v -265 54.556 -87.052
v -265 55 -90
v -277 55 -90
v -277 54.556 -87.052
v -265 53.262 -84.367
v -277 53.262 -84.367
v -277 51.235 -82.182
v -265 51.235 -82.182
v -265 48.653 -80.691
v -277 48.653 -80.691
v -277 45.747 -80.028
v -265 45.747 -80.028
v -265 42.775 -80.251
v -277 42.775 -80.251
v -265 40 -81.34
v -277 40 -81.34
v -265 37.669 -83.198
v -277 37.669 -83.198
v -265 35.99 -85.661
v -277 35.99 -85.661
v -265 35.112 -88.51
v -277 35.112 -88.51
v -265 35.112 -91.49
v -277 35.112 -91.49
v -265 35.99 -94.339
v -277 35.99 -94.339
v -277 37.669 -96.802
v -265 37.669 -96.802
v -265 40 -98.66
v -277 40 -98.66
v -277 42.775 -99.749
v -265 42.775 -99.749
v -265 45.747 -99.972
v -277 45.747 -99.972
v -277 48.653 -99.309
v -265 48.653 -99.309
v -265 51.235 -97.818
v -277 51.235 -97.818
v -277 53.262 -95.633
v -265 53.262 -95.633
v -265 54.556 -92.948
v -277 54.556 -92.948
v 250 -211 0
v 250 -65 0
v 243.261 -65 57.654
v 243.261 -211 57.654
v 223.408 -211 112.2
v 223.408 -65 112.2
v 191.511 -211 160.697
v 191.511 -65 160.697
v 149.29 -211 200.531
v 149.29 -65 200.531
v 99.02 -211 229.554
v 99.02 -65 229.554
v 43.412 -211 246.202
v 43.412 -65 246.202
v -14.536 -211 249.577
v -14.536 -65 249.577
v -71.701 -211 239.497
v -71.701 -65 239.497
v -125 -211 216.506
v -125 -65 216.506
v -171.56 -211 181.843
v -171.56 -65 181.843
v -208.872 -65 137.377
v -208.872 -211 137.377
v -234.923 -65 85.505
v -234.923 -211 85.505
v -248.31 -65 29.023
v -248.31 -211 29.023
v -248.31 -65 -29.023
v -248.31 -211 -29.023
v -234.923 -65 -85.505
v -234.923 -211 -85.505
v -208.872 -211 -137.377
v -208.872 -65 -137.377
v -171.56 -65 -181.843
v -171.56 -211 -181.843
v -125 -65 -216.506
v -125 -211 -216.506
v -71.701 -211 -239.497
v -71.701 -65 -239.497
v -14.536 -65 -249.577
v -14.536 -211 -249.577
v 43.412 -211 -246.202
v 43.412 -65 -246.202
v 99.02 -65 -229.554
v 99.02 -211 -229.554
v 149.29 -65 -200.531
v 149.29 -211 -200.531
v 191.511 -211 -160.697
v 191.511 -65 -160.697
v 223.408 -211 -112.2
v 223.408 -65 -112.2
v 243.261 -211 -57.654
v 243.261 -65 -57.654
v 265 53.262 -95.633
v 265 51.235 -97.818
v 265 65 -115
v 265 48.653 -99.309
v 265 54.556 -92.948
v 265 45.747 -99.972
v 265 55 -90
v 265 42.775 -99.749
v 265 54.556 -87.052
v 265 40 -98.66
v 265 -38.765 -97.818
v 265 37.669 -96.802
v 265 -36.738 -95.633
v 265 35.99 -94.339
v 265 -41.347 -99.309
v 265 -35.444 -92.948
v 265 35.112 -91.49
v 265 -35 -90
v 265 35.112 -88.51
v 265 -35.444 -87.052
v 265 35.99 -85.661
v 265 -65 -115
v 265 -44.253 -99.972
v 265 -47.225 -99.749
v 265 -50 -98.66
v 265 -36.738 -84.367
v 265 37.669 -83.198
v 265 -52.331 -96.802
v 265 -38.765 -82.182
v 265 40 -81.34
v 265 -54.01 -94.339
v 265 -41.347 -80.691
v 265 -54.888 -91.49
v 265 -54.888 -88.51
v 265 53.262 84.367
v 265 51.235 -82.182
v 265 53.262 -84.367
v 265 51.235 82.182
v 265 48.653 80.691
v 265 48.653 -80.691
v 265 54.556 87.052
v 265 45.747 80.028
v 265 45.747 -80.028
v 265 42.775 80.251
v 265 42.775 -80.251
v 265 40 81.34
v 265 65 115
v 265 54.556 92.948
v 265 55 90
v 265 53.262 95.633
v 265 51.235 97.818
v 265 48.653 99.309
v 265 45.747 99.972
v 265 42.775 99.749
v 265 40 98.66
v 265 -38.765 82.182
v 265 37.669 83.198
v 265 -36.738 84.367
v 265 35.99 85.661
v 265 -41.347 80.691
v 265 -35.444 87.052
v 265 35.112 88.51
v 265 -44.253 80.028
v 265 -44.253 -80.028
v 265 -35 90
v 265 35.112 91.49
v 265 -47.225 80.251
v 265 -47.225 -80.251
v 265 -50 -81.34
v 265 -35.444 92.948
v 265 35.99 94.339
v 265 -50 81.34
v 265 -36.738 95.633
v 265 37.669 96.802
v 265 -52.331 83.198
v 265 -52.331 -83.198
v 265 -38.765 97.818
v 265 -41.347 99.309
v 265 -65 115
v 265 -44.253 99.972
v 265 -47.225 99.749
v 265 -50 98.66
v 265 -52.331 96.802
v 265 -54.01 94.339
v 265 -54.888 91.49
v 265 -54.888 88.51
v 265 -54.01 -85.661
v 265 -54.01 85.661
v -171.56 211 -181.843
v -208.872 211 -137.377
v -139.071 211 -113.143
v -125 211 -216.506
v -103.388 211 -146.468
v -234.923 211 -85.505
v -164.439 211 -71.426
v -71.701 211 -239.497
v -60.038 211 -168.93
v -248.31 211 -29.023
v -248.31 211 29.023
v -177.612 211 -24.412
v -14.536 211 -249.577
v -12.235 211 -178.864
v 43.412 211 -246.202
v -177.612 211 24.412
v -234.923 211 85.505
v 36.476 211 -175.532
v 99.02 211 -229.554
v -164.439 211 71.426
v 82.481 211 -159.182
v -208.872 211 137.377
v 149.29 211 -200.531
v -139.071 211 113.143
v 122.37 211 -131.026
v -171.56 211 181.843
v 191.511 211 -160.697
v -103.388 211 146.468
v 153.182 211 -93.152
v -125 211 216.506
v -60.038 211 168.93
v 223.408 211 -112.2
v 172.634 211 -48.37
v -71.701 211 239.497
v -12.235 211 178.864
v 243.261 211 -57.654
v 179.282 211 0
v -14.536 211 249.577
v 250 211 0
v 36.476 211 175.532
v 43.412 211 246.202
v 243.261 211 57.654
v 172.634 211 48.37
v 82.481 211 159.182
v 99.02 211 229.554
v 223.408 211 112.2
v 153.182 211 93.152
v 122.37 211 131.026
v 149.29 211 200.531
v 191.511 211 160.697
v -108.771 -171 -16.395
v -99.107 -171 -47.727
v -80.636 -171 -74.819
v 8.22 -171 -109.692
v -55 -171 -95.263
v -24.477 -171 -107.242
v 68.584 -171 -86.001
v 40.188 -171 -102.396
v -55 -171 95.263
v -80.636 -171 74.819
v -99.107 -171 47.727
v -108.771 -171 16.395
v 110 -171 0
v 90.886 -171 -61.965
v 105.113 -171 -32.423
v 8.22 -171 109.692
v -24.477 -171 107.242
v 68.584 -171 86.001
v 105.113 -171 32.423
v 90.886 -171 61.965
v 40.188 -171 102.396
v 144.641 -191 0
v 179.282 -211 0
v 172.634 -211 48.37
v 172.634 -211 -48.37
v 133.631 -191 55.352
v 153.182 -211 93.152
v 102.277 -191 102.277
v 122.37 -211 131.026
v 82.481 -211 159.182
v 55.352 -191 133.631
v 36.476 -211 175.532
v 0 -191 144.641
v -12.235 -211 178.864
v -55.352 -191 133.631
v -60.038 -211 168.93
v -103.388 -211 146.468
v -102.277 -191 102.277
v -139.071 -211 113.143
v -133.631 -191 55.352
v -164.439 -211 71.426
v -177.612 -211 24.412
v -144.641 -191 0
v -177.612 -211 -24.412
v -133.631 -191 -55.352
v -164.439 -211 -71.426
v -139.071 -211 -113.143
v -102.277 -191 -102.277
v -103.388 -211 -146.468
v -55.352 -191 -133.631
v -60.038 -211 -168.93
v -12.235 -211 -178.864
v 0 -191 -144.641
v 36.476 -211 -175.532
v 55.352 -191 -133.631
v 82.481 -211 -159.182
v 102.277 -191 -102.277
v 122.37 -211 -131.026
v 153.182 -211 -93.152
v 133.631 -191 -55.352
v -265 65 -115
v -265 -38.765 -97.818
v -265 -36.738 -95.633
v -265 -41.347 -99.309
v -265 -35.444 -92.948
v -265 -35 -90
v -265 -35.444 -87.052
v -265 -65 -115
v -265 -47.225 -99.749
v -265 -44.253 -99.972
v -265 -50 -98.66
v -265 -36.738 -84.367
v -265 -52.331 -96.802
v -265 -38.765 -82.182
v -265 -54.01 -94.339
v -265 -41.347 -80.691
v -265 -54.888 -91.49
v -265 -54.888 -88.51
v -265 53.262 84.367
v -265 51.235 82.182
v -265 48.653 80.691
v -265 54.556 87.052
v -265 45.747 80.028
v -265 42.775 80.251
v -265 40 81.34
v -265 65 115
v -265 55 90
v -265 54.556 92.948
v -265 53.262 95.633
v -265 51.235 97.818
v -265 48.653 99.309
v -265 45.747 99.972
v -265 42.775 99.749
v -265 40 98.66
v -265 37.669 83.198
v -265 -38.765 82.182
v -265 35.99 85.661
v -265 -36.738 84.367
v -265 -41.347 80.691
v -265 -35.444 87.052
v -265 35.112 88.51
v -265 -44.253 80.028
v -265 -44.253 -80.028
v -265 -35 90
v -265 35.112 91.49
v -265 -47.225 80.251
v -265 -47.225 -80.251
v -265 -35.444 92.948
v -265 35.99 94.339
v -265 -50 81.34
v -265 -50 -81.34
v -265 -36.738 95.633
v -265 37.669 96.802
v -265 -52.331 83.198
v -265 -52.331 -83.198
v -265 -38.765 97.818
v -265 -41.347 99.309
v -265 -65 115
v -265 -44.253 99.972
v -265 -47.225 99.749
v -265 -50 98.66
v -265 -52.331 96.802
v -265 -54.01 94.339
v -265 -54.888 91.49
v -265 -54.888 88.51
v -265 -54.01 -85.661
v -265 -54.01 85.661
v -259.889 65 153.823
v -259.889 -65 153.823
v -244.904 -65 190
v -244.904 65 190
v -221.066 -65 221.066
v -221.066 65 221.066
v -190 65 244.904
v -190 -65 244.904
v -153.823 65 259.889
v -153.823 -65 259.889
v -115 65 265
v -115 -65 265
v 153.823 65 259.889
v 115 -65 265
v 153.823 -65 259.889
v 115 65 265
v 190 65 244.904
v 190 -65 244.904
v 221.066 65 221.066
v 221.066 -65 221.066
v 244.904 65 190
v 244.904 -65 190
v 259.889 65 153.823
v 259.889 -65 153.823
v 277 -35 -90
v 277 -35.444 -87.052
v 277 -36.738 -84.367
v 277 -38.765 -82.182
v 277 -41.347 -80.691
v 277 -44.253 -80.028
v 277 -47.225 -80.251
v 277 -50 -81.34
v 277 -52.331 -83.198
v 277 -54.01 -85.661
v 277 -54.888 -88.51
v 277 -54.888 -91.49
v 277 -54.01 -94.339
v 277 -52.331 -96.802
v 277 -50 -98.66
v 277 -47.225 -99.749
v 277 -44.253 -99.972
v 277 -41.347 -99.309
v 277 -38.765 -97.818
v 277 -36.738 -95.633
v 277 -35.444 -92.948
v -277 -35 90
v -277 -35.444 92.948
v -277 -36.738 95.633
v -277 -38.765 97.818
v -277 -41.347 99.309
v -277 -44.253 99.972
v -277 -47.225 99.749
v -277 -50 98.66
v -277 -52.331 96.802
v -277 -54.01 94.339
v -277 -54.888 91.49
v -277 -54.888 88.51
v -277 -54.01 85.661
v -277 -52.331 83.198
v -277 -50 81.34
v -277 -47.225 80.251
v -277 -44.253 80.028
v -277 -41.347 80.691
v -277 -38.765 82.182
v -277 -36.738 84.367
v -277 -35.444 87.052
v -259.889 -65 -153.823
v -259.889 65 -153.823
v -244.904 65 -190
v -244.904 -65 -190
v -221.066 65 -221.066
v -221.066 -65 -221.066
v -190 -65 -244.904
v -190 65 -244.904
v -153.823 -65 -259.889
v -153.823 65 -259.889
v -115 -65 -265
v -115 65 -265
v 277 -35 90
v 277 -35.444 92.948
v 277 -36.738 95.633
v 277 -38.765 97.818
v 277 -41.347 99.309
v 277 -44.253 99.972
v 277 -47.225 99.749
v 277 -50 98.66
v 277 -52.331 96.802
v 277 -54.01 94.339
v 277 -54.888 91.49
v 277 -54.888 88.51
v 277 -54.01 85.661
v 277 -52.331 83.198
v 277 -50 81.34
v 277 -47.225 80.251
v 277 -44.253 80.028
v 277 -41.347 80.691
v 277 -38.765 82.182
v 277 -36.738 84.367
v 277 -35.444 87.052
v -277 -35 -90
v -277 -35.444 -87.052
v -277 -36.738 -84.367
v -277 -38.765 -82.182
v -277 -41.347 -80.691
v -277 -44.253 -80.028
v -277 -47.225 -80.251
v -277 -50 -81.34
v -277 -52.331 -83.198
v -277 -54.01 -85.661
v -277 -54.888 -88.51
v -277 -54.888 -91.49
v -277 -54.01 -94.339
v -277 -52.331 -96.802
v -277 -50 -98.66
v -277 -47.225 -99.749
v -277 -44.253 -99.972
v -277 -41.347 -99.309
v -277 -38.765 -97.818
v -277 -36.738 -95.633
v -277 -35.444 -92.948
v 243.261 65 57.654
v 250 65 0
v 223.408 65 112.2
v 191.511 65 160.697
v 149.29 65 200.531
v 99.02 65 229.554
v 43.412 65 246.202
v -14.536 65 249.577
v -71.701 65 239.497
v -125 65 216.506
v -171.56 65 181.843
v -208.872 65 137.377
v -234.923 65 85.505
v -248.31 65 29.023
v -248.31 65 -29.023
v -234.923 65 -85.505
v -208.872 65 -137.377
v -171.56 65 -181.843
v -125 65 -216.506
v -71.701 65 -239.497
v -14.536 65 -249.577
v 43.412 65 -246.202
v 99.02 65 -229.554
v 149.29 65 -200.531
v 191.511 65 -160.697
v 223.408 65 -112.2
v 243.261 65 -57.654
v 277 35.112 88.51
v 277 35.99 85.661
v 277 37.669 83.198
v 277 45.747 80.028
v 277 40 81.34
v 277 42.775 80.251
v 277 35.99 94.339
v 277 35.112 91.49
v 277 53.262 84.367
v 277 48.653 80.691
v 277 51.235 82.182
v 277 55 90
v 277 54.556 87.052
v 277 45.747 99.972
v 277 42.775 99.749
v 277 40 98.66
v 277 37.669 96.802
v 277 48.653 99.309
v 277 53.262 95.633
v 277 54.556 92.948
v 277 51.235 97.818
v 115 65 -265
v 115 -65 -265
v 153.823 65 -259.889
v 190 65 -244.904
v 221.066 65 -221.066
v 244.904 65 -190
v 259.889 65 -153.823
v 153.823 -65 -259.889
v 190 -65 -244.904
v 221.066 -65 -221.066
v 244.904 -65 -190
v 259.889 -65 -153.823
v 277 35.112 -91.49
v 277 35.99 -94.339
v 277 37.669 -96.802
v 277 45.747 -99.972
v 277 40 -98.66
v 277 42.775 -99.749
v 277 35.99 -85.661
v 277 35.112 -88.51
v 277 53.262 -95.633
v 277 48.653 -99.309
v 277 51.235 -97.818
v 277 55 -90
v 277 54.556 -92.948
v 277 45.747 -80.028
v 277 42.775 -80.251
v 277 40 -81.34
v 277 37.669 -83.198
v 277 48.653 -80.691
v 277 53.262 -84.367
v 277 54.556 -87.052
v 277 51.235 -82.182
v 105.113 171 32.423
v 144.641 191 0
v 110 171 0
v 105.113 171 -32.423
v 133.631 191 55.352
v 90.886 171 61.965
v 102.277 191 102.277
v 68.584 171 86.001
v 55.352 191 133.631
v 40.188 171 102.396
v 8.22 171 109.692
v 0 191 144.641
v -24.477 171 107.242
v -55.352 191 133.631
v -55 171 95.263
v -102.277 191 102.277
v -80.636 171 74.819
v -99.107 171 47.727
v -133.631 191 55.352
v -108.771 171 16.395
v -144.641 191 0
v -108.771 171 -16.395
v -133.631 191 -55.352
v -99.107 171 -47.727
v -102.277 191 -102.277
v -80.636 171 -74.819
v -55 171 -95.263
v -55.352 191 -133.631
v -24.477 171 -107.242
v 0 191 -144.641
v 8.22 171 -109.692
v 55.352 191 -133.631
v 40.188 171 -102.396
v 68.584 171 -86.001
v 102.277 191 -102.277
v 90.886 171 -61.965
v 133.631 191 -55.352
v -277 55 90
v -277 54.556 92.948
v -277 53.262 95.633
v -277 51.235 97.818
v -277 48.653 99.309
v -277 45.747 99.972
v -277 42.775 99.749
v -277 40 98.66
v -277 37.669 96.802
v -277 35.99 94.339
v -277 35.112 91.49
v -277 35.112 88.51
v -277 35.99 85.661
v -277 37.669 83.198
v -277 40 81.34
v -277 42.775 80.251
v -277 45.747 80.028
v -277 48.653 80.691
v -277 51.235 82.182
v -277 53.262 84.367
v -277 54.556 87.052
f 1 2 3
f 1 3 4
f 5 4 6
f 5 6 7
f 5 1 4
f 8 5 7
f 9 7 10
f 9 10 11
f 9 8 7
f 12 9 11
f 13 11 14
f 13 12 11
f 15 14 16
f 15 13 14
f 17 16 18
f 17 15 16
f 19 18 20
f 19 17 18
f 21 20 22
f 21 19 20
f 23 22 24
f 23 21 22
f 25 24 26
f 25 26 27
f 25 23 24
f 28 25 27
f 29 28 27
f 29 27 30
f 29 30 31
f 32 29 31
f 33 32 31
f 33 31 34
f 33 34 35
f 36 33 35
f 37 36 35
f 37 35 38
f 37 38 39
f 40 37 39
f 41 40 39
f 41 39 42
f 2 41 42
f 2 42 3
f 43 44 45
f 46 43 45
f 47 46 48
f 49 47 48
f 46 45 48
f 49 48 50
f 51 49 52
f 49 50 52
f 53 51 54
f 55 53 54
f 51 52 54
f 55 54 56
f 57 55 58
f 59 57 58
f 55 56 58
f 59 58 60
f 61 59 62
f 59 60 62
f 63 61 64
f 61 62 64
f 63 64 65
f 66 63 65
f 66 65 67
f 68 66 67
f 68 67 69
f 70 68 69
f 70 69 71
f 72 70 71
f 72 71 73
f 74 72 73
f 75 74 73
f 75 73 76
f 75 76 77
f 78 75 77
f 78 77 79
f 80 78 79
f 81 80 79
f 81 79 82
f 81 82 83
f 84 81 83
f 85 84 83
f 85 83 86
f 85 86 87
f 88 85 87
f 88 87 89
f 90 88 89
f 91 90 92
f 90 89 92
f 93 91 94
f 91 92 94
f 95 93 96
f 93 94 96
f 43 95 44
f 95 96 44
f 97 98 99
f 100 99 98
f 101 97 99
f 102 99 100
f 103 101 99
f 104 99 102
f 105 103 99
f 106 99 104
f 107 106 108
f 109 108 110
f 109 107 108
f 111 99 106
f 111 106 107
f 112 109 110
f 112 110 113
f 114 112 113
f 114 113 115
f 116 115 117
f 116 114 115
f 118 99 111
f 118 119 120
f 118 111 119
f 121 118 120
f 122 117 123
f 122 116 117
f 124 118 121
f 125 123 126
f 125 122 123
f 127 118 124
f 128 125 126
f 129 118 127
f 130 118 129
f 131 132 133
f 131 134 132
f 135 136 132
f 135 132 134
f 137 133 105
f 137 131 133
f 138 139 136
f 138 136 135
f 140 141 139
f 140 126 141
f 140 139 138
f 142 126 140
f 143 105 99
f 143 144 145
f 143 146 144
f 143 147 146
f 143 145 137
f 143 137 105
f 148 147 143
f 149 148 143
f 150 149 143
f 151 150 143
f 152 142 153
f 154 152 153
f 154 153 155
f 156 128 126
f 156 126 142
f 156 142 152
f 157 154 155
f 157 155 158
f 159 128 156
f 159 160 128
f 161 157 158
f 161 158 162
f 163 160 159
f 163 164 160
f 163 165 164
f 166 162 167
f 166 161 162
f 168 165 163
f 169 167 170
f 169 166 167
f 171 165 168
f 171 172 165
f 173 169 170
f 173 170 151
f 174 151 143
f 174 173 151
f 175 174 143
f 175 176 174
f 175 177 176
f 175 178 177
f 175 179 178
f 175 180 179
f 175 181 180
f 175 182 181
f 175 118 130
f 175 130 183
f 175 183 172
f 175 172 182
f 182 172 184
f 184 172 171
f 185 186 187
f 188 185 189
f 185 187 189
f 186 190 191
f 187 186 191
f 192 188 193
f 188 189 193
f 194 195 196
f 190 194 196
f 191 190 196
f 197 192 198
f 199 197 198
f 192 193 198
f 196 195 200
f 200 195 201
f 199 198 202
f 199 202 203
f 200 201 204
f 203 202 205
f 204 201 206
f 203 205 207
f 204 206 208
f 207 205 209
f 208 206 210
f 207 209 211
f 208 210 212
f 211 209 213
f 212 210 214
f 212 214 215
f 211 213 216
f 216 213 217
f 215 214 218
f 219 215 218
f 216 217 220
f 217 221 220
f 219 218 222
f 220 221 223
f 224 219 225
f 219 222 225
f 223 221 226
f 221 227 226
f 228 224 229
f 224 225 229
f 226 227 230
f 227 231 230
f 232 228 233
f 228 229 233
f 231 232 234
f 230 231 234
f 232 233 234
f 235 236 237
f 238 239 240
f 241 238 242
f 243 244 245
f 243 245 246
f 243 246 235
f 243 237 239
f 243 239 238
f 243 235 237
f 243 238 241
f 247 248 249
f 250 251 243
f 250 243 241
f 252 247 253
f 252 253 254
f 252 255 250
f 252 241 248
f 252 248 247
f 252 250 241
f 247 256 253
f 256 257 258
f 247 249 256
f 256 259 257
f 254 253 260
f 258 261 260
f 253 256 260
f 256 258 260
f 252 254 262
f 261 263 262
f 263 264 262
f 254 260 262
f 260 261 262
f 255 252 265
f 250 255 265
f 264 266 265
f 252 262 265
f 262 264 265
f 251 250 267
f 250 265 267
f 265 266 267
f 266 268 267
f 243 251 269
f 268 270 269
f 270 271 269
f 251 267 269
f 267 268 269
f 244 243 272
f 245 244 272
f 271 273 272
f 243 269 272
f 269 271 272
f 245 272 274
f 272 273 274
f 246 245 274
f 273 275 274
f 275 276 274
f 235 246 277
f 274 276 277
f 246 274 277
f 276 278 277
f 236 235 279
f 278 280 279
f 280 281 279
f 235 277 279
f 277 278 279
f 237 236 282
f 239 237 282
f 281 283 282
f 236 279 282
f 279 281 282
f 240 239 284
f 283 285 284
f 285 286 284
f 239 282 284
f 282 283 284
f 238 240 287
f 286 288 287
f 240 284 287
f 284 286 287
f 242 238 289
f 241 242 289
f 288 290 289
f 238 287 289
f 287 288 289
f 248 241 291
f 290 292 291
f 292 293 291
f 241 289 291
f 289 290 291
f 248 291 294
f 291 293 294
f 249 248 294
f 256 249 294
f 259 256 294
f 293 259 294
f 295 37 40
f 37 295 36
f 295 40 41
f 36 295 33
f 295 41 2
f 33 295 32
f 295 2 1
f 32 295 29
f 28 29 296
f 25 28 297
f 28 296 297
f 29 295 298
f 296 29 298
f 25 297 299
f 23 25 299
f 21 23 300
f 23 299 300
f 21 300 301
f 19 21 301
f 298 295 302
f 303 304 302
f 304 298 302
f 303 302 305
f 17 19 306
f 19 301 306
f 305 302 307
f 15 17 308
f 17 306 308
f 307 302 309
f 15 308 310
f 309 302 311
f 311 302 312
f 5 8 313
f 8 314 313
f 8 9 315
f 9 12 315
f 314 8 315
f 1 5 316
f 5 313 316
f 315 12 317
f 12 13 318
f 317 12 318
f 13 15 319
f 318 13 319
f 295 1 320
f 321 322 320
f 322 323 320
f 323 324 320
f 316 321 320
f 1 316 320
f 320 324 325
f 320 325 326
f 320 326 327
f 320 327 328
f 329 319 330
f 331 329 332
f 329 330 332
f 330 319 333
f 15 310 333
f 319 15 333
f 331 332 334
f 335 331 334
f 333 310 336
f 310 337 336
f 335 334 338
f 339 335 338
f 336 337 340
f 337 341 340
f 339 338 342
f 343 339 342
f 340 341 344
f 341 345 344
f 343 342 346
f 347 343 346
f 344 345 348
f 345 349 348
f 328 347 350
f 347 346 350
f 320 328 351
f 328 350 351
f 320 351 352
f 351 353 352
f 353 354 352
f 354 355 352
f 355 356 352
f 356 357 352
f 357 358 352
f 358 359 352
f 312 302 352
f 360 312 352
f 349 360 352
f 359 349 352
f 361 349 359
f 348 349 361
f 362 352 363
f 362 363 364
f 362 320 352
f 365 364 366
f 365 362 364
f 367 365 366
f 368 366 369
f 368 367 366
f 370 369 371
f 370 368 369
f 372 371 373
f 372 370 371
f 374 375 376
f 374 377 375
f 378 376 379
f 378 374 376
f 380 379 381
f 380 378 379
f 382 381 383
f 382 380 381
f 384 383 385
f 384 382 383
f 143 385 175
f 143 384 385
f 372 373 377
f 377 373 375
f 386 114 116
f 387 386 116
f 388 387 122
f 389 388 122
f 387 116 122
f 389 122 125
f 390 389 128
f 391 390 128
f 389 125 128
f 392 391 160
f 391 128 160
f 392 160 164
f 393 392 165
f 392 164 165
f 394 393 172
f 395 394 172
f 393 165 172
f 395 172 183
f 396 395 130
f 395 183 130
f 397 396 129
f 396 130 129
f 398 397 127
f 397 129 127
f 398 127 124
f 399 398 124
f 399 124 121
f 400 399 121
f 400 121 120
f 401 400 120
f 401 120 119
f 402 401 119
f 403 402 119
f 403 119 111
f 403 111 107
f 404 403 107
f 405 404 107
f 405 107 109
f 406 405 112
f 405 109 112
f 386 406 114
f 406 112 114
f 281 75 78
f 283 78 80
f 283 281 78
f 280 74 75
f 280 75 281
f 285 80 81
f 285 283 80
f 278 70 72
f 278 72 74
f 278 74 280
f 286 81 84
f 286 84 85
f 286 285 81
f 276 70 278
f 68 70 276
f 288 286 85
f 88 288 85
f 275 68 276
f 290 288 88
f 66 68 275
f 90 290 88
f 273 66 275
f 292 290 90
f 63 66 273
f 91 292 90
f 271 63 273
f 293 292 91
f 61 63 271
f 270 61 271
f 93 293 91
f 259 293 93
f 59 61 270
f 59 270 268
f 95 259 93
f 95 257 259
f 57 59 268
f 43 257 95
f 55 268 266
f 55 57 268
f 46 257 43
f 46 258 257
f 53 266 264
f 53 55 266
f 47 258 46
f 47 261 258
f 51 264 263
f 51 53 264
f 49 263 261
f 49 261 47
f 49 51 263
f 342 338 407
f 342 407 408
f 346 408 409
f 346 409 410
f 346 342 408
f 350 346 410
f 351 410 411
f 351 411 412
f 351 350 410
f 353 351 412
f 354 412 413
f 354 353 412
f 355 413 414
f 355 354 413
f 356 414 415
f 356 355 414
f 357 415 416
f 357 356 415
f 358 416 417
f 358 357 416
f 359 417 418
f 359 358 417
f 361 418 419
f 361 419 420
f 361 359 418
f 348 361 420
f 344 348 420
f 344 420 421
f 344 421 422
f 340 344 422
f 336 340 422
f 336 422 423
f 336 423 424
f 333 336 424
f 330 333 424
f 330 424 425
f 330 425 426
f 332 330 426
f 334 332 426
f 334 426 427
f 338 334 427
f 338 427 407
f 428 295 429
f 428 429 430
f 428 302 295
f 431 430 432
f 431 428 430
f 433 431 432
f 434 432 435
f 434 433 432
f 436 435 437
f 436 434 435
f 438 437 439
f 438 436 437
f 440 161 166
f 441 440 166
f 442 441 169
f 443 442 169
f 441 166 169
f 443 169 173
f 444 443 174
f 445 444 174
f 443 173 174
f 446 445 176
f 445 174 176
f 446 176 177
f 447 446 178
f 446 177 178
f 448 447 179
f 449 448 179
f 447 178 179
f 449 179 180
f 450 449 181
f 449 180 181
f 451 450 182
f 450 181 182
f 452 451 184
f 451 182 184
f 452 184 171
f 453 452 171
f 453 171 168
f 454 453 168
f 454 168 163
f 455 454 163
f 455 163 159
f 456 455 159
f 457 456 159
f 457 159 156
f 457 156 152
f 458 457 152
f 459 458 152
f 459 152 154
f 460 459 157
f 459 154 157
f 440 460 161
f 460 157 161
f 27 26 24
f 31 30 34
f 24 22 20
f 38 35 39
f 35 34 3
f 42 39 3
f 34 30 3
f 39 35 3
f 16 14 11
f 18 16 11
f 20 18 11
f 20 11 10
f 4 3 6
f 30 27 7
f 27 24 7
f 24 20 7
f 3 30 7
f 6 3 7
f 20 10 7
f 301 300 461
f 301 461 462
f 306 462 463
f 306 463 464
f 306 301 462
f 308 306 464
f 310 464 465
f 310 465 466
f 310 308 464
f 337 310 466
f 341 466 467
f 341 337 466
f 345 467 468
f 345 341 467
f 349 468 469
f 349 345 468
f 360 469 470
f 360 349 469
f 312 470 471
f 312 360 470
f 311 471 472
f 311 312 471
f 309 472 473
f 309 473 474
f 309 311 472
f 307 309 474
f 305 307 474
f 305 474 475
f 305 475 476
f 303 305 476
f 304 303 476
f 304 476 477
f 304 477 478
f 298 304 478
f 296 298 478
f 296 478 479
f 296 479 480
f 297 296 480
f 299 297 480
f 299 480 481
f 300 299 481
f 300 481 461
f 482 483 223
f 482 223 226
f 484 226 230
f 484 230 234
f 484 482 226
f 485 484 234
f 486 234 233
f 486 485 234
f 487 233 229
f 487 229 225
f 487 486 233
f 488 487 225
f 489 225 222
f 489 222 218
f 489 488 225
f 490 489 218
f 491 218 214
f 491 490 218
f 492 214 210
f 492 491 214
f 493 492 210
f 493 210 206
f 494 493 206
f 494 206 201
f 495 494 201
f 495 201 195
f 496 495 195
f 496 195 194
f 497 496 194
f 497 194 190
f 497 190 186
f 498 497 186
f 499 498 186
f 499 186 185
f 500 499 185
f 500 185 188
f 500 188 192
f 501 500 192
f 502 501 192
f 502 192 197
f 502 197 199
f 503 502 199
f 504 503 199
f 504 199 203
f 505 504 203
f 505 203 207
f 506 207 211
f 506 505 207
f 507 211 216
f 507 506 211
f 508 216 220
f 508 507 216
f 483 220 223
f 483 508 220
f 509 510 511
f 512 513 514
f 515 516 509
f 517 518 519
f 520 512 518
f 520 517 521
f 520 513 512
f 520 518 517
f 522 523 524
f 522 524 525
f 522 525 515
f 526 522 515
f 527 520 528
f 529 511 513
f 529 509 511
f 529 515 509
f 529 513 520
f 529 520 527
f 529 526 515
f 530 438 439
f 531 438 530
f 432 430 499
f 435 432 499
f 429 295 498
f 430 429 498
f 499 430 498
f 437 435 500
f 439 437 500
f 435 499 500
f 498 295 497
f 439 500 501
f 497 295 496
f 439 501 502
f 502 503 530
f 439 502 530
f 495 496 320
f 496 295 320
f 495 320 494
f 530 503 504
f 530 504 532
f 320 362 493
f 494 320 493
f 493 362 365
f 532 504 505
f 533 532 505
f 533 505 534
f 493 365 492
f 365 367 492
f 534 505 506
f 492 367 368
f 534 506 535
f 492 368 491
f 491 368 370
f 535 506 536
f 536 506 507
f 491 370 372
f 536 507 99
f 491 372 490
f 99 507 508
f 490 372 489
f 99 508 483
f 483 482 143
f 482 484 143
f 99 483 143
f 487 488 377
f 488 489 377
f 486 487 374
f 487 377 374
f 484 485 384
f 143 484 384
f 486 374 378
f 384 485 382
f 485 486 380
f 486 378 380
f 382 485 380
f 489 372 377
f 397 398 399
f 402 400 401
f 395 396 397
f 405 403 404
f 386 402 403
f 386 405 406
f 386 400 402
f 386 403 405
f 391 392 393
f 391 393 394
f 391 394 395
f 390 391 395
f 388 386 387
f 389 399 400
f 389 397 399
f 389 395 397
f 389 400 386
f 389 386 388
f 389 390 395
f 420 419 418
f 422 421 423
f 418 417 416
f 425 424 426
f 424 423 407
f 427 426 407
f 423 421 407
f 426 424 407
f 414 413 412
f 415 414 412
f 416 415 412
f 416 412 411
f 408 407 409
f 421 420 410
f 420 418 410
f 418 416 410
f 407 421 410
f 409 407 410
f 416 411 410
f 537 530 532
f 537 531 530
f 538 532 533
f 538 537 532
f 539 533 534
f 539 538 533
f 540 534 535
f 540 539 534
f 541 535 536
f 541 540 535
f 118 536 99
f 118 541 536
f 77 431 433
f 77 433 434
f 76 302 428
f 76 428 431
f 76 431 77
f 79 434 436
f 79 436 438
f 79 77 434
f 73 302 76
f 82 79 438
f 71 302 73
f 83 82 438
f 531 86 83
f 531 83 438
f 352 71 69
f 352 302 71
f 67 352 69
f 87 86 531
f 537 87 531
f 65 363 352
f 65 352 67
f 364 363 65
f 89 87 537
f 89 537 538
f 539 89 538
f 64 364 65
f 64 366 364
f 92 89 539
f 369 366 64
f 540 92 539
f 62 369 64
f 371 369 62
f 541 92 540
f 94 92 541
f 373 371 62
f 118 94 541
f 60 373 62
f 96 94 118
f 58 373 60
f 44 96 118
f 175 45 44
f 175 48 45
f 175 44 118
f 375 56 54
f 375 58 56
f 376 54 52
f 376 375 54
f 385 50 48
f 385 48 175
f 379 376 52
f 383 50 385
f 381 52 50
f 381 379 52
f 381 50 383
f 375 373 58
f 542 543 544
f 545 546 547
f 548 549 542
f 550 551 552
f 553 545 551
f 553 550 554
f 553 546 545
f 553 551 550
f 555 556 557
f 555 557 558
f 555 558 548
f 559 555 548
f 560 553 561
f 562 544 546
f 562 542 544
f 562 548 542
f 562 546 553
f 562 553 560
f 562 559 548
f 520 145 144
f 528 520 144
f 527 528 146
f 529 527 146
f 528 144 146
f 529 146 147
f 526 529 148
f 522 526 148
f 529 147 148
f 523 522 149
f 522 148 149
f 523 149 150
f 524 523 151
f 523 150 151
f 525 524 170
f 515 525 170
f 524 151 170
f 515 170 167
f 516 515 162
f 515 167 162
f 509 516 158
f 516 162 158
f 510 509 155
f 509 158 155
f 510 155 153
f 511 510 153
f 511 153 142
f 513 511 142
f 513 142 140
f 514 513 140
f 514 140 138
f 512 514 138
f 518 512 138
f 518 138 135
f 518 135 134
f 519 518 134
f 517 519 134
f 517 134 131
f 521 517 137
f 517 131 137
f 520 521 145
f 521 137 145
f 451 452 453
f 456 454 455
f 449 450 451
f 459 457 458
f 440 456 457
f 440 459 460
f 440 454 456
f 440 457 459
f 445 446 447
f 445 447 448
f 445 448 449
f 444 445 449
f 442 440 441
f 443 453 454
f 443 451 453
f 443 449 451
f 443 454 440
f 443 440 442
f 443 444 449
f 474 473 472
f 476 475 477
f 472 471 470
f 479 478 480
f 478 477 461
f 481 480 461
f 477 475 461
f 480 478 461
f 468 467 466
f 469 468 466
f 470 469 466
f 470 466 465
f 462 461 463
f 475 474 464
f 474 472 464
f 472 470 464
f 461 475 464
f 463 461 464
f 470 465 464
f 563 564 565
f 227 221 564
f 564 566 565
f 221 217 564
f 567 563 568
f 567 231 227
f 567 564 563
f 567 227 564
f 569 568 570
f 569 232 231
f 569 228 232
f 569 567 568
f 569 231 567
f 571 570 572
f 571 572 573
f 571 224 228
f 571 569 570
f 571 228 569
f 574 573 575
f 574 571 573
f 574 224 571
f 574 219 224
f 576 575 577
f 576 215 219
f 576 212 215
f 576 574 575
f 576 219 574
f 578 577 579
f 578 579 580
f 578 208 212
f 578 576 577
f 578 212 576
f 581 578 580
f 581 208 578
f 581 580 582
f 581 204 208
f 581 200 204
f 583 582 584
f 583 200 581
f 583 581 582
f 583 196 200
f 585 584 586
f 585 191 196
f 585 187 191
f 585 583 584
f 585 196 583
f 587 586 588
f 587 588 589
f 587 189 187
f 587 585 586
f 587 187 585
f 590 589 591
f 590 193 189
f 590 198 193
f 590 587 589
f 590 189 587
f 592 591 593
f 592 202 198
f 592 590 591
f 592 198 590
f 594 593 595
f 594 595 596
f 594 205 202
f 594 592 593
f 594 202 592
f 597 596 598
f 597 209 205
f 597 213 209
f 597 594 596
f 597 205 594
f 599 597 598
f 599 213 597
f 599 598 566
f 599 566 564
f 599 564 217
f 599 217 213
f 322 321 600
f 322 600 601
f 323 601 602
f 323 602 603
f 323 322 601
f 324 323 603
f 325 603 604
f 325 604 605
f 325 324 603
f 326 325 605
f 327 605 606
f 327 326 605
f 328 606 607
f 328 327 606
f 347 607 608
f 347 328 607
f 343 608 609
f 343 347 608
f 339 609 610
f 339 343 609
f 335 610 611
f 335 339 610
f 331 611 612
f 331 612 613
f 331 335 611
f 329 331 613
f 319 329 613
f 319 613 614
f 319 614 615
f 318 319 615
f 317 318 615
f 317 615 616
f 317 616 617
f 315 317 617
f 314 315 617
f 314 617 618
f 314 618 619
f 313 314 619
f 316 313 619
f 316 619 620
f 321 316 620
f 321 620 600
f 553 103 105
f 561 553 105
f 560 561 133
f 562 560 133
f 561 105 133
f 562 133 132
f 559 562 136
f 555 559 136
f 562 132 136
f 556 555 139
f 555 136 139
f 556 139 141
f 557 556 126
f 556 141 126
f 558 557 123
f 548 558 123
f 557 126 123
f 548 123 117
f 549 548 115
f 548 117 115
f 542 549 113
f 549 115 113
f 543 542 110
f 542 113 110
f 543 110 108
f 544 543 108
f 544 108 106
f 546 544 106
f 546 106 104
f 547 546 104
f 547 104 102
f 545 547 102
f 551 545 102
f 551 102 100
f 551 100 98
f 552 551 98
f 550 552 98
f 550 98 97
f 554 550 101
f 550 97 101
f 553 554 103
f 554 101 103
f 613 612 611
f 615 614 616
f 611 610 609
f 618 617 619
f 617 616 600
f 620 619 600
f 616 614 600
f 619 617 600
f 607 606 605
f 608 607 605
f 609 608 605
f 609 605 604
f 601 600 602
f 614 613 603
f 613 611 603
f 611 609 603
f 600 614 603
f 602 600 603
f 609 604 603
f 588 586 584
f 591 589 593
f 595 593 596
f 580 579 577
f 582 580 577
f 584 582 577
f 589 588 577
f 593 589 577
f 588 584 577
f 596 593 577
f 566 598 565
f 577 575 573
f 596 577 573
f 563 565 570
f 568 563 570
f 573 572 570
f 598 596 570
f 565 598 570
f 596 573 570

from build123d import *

# Parameters (mm, degrees)
F0_W          = 530
F0_H          = 530
F0_R          = 250
F1_DEPTH      = 65
F1_DEPTH_BACK = 65
F2_R          = 10
F3_DEPTH      = 12
F3_DEPTH_BACK = 542
F4_R          = 150
F0_R_2        = 110
F5_DEPTH      = 211
F5_DEPTH_BACK = 211
F6_DEPTH      = 171
F6_DEPTH_BACK = 171
F7_SIZE2      = 69.282022
F7_SIZE       = 39.99999
F8_SIZE2      = 69.282022
F8_SIZE       = 39.99999


# Not quite as in the source:
# - a fillet or chamfer is up to 0.001 mm smaller than in the source, because OpenCascade refuses the exact size


with BuildPart() as f1:
    # F0 (on Front) → F1 (new body, two sides)
    with BuildSketch(Plane.XZ) as f1_sk:
        Rectangle(F0_W, F0_H)
        Circle(F0_R, mode=Mode.SUBTRACT)
    extrude(amount=F1_DEPTH)
    extrude(f1_sk.sketch, amount=-F1_DEPTH_BACK)

    # F2 (on face) → F3 (join, two sides)
    with BuildSketch(Plane.YZ.offset(265)) as f3_sk:
        with Locations((-45, 90)):
            Circle(F2_R)
        with Locations((45, 90)):
            Circle(F2_R)
        with Locations((45, -90)):
            Circle(F2_R)
        with Locations((-45, -90)):
            Circle(F2_R)
    extrude(amount=F3_DEPTH)
    extrude(f3_sk.sketch, amount=-F3_DEPTH_BACK)

    # F4
    f4_edges = [f1.edges().sort_by_distance(p)[0] for p in [
        (265, 0, 265),
        (-265, 0, 265),
        (265, 0, -265),
        (-265, 0, -265),
    ]]
    fillet(f4_edges, radius=F4_R)

    # F0 (on Front) → F5 (join, two sides)
    with BuildSketch(Plane.XZ) as f5_sk:
        Circle(F0_R)
        Circle(F0_R_2, mode=Mode.SUBTRACT)
    extrude(amount=F5_DEPTH)
    extrude(f5_sk.sketch, amount=-F5_DEPTH_BACK)

    # F0 (on Front) → F6 (join, two sides)
    with BuildSketch(Plane.XZ) as f6_sk:
        Circle(F0_R_2)
    extrude(amount=F6_DEPTH)
    extrude(f6_sk.sketch, amount=-F6_DEPTH_BACK)

    # F7 (size 40 and 69.2820323028 in the source; OpenCascade refuses exactly that, so slightly less here)
    f7_edges = [f1.edges().sort_by_distance(p)[0] for p in [
        (-110, -211, 0),
    ]]
    f7_side = f1.faces().sort_by_distance((-110, -191, 0))[0]
    chamfer(f7_edges, length=F7_SIZE, length2=F7_SIZE2, reference=f7_side)

    # F8 (size 40 and 69.2820323028 in the source; OpenCascade refuses exactly that, so slightly less here)
    f8_edges = [f1.edges().sort_by_distance(p)[0] for p in [
        (-110, 211, 0),
    ]]
    f8_side = f1.faces().sort_by_distance((-110, 191, 0))[0]
    chamfer(f8_edges, length=F8_SIZE, length2=F8_SIZE2, reference=f8_side)


solid = f1.part
